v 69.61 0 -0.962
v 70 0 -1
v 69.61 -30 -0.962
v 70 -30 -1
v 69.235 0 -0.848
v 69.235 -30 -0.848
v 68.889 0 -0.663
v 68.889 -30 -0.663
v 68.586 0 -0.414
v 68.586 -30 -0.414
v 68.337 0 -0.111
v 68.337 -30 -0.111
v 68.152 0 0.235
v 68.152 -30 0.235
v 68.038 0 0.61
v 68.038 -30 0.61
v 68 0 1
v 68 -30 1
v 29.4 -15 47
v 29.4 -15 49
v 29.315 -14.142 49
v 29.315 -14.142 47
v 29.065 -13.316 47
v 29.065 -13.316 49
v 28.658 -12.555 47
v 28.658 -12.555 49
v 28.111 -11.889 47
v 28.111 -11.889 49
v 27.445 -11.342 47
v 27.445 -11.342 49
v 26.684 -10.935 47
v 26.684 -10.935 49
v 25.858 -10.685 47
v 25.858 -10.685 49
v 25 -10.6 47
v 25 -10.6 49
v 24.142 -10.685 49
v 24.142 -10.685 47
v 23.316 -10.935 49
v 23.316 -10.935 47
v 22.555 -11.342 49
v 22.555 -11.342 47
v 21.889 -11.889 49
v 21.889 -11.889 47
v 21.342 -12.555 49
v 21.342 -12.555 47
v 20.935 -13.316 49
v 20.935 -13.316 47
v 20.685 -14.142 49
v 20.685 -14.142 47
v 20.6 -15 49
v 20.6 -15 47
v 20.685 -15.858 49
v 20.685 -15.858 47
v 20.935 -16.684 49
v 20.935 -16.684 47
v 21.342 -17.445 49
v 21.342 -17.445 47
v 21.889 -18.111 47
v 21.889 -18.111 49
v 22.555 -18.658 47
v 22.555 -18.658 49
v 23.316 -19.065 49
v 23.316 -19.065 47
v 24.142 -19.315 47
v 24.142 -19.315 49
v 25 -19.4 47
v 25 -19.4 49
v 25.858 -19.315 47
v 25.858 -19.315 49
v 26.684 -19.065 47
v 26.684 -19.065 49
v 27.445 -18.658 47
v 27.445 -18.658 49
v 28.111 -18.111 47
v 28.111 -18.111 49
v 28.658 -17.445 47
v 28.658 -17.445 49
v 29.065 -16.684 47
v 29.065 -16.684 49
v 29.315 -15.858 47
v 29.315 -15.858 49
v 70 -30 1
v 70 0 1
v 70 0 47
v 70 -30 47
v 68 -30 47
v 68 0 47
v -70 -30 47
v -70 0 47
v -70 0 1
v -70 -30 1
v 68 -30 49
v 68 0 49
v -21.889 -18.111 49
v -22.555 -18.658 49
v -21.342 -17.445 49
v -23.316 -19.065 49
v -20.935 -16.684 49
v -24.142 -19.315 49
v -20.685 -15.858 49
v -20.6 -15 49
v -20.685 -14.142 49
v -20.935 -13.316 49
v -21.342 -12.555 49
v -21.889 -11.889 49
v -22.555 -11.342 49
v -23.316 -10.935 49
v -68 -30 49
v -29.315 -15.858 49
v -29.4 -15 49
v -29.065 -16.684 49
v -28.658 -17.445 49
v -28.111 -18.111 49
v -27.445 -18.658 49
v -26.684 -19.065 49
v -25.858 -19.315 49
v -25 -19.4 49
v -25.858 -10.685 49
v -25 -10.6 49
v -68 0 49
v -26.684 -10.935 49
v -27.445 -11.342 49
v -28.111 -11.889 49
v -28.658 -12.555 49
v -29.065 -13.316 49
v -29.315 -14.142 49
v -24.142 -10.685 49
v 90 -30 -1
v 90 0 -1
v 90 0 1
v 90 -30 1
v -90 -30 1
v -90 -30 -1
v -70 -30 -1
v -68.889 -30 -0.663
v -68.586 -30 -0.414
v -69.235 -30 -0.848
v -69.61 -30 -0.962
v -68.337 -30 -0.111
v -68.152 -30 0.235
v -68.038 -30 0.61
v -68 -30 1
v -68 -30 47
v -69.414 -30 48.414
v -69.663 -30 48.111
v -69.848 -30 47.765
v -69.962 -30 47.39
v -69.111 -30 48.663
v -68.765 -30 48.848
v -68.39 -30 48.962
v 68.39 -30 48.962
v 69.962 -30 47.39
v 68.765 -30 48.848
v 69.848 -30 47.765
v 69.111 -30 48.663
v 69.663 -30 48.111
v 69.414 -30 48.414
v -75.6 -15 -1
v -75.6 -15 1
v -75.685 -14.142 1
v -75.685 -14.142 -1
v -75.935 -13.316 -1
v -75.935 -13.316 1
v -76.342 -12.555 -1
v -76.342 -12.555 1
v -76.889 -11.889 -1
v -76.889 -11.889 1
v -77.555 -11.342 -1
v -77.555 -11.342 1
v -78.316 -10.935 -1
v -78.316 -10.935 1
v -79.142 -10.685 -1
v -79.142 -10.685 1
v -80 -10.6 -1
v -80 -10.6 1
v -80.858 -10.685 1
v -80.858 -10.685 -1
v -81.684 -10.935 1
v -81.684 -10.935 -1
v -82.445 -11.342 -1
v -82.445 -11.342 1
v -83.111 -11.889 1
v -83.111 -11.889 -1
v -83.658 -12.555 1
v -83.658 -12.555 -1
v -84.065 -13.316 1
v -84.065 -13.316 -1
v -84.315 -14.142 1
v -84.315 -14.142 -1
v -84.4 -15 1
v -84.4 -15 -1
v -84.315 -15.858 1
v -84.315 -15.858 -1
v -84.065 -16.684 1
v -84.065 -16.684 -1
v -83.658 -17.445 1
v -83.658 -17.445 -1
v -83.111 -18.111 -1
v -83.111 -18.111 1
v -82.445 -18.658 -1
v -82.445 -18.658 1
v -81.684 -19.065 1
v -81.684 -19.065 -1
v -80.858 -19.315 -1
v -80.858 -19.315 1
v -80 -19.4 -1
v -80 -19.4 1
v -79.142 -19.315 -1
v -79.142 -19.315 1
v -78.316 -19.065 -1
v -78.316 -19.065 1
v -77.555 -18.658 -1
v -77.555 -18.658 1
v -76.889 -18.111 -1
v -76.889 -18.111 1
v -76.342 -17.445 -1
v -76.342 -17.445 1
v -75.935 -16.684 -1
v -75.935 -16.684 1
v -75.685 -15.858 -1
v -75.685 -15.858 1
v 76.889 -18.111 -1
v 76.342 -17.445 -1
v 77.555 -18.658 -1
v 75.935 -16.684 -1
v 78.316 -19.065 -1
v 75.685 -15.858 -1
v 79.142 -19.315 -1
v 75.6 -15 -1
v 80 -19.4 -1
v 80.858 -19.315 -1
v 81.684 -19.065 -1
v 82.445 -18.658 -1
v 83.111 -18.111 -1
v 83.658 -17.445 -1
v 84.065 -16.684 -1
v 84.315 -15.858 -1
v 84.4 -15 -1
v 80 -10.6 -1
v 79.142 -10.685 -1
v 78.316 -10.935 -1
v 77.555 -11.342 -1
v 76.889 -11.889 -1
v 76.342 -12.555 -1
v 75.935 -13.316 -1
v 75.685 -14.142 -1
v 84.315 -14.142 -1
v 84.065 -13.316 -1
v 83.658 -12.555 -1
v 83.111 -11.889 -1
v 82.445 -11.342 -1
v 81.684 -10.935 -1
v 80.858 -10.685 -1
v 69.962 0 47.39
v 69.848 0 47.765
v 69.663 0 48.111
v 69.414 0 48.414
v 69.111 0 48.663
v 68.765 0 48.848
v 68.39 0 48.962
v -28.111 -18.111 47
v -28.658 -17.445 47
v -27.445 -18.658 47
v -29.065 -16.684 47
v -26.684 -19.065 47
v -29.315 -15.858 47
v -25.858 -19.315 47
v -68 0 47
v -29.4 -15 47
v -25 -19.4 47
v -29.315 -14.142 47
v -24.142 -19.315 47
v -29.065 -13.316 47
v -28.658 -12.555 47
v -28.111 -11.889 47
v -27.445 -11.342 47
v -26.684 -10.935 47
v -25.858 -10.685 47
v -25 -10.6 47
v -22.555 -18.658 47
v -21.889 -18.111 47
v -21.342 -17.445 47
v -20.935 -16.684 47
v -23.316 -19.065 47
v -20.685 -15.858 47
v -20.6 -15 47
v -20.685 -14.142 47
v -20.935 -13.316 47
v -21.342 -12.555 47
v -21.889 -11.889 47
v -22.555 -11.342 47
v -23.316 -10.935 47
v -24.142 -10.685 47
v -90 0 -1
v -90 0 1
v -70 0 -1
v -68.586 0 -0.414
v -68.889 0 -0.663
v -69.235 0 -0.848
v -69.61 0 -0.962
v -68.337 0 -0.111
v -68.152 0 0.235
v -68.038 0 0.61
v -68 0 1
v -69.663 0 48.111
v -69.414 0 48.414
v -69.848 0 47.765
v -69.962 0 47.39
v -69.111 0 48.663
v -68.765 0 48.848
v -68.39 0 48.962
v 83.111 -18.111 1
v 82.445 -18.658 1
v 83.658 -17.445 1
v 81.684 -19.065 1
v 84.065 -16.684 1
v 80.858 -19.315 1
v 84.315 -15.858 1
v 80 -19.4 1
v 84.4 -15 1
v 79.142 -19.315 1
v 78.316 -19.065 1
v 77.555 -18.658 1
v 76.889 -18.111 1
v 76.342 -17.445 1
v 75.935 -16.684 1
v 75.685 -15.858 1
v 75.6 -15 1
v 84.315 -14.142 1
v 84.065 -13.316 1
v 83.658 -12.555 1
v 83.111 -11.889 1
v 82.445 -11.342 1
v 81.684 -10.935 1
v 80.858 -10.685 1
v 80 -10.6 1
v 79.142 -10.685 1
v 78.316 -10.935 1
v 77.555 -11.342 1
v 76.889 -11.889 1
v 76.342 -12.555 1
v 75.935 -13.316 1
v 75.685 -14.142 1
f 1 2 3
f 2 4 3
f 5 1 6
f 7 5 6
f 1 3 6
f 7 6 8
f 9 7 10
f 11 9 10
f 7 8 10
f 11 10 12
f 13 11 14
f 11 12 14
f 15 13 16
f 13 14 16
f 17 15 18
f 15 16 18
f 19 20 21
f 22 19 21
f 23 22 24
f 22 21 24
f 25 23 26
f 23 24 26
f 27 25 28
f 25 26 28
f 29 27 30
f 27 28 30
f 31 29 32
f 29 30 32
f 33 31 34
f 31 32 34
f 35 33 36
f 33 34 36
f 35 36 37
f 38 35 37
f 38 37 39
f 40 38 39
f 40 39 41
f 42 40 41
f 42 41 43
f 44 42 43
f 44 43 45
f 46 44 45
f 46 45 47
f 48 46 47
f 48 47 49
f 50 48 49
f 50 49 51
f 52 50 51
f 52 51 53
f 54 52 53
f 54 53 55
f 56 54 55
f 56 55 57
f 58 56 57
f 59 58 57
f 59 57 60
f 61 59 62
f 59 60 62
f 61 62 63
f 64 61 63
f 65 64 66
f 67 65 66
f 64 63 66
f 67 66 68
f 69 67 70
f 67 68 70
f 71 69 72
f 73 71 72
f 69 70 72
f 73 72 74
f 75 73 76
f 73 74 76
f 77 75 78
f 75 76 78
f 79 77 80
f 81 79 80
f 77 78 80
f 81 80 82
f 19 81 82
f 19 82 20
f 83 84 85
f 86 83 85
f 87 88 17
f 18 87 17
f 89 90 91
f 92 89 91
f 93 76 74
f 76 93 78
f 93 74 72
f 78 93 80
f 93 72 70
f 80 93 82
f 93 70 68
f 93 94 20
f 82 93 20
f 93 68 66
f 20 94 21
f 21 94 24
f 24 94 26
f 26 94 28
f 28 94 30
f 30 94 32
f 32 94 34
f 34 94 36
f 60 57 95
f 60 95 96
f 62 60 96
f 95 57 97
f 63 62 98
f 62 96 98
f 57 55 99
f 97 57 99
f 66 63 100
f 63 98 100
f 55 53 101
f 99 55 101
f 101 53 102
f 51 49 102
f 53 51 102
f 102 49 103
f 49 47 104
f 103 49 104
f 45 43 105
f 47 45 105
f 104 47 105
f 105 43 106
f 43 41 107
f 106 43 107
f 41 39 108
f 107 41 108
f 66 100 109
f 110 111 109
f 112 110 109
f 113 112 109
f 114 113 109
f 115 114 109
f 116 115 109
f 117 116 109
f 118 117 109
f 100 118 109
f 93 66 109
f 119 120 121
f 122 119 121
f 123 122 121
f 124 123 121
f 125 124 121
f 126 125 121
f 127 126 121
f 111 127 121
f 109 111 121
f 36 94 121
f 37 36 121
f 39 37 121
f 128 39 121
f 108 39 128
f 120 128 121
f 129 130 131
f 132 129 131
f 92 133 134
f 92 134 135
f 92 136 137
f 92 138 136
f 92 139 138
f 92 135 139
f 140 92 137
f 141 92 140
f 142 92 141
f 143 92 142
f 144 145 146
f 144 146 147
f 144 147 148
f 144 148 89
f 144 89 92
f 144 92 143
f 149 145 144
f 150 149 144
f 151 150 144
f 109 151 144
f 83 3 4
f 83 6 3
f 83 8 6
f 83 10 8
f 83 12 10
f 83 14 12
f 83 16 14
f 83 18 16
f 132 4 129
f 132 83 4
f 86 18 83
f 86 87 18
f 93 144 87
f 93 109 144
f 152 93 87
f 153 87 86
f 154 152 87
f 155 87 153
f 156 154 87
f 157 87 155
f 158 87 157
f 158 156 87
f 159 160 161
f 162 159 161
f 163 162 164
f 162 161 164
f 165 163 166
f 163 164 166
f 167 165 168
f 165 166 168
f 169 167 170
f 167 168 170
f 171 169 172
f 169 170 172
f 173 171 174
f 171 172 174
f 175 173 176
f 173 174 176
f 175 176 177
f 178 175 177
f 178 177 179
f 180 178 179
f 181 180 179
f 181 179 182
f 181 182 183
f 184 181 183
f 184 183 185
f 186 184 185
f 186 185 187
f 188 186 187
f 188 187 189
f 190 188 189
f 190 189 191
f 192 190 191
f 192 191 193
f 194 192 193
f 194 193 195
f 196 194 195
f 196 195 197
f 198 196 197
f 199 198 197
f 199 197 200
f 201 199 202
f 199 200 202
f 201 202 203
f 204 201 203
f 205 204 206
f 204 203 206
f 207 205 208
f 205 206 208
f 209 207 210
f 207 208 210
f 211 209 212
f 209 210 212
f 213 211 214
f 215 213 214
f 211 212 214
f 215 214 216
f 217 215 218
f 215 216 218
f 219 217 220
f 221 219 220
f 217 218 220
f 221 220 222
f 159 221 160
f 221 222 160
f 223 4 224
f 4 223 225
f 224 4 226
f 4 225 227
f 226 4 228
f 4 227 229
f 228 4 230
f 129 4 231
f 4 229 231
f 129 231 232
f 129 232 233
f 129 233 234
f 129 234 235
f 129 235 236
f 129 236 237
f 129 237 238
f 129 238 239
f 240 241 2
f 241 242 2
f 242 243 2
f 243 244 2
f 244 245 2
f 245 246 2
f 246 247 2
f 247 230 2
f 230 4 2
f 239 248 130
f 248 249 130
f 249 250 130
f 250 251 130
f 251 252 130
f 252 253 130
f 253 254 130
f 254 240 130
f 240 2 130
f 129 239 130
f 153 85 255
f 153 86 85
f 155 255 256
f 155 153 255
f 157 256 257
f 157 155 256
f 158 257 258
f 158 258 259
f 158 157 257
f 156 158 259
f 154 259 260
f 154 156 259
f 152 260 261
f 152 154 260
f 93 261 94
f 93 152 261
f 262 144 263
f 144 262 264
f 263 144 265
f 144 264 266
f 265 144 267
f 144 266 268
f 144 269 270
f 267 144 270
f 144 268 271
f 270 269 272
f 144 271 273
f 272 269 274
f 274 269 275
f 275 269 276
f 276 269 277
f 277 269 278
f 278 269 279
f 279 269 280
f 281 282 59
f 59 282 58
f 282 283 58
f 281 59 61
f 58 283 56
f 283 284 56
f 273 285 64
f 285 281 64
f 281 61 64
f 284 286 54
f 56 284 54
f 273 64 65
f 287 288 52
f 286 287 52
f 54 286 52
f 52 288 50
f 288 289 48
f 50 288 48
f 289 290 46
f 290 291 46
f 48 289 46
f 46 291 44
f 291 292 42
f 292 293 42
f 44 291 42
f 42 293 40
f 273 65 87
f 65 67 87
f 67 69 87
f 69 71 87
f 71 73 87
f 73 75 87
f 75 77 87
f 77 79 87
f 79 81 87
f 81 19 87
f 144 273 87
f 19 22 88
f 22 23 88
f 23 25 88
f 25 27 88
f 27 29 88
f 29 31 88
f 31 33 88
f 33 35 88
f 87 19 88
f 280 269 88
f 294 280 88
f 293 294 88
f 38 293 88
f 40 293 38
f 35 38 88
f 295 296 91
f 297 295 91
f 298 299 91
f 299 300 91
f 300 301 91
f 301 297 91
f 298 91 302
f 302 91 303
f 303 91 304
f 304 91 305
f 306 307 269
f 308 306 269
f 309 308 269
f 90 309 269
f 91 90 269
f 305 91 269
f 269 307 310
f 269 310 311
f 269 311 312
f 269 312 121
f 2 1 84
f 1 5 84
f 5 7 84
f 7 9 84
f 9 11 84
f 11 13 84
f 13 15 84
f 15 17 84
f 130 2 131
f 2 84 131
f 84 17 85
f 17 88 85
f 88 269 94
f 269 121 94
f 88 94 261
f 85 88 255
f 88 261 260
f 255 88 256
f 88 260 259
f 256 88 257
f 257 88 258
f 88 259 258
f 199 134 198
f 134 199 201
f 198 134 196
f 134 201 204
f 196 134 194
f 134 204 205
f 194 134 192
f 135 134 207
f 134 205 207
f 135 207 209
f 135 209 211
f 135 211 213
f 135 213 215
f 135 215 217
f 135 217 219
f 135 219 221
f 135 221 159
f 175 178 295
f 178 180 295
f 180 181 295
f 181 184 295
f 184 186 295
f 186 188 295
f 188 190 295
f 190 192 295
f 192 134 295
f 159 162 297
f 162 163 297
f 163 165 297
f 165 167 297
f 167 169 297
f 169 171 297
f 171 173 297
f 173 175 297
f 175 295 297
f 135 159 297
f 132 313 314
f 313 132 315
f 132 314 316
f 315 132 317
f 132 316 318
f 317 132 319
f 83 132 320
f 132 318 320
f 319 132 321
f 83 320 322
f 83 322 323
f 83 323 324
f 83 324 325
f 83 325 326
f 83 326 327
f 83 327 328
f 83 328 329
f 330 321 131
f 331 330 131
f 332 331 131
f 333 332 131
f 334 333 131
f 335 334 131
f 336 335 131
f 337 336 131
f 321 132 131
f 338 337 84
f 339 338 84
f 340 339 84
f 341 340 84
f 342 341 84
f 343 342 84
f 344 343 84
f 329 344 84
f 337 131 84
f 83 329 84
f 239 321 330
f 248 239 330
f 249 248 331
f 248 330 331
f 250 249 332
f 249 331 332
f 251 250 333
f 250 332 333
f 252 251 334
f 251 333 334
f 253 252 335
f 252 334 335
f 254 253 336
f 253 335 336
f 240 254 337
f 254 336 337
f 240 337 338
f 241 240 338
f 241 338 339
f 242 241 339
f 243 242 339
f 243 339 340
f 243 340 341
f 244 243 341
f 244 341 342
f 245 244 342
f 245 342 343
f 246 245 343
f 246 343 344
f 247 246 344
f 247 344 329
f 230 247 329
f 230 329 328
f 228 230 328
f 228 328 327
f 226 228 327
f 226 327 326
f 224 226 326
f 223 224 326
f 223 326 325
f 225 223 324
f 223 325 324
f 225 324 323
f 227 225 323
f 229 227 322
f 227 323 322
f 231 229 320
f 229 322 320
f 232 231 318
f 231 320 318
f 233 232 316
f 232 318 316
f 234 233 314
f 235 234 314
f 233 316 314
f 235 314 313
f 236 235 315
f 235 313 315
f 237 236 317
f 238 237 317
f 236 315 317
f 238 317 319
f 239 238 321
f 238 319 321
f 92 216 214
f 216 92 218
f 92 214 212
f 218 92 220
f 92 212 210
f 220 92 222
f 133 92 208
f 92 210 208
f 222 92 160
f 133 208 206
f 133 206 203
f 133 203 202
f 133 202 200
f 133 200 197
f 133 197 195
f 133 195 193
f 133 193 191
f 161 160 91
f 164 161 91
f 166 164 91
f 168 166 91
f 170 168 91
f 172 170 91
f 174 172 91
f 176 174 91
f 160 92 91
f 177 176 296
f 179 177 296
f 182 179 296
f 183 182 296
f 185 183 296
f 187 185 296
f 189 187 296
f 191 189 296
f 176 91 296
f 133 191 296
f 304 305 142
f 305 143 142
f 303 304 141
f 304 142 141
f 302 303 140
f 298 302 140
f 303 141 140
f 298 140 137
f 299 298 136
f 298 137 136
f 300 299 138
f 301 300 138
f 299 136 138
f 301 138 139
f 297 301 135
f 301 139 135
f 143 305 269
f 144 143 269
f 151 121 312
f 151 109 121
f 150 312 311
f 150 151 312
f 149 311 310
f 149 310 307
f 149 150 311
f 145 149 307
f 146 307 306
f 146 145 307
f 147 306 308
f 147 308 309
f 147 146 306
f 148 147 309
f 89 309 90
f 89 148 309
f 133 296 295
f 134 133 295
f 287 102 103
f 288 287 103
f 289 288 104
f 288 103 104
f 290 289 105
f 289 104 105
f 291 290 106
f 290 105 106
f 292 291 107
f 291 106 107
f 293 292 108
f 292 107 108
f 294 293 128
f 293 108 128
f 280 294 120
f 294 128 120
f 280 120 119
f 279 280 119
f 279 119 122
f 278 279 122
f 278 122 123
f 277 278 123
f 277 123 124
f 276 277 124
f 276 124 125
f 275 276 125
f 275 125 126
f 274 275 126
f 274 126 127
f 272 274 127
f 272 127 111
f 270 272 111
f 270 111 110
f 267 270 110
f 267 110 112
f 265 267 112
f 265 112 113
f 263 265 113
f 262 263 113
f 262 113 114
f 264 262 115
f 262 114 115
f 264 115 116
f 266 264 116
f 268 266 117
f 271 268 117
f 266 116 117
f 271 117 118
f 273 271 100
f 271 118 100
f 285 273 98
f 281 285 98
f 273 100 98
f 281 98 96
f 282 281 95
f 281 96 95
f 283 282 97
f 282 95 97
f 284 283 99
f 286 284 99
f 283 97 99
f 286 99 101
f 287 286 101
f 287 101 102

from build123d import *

# Parameters (mm, degrees)
F1_DEPTH = 30
F2_R     = 4.4
F3_R     = 4.4
F4_DEPTH = 25
F5_R     = 2
F6_R     = 2


# Not quite as in the source:
# - a feature names something its author has since deleted; it is built from what else it names


with BuildPart() as f1:
    # F0 (on Front) → F1 (new body)
    with BuildSketch(Plane.XZ):
        Polygon((90, -1), (90, 1), (70, 1), (70, 49), (-70, 49), (-70, 1), (-90, 1), (-90, -1), (-68, -1), (-68, 47), (68, 47), (68, -1), align=None)
    extrude(amount=F1_DEPTH)

    # F2 (on face) + F3 (on face) → F4 (cut)
    with BuildSketch(Plane.XY.offset(1)):
        with Locations((-80, -15)):
            Circle(F2_R)
        with Locations((80, -15)):
            Circle(F2_R)
    with BuildSketch(Plane.XY.offset(49)):
        with Locations((-25, -15)):
            Circle(F3_R)
        with Locations((25, -15)):
            Circle(F3_R)
    extrude(amount=-F4_DEPTH, mode=Mode.SUBTRACT)

    # F5
    f5_edges = [f1.edges().sort_by_distance(p)[0] for p in [
        (-70, -15, 49),
        (70, -15, 49),
    ]]
    fillet(f5_edges, radius=F5_R)

    # F6
    f6_edges = [f1.edges().sort_by_distance(p)[0] for p in [
        (68, -15, -1),
        (-68, -15, -1),
    ]]
    fillet(f6_edges, radius=F6_R)


solid = f1.part
